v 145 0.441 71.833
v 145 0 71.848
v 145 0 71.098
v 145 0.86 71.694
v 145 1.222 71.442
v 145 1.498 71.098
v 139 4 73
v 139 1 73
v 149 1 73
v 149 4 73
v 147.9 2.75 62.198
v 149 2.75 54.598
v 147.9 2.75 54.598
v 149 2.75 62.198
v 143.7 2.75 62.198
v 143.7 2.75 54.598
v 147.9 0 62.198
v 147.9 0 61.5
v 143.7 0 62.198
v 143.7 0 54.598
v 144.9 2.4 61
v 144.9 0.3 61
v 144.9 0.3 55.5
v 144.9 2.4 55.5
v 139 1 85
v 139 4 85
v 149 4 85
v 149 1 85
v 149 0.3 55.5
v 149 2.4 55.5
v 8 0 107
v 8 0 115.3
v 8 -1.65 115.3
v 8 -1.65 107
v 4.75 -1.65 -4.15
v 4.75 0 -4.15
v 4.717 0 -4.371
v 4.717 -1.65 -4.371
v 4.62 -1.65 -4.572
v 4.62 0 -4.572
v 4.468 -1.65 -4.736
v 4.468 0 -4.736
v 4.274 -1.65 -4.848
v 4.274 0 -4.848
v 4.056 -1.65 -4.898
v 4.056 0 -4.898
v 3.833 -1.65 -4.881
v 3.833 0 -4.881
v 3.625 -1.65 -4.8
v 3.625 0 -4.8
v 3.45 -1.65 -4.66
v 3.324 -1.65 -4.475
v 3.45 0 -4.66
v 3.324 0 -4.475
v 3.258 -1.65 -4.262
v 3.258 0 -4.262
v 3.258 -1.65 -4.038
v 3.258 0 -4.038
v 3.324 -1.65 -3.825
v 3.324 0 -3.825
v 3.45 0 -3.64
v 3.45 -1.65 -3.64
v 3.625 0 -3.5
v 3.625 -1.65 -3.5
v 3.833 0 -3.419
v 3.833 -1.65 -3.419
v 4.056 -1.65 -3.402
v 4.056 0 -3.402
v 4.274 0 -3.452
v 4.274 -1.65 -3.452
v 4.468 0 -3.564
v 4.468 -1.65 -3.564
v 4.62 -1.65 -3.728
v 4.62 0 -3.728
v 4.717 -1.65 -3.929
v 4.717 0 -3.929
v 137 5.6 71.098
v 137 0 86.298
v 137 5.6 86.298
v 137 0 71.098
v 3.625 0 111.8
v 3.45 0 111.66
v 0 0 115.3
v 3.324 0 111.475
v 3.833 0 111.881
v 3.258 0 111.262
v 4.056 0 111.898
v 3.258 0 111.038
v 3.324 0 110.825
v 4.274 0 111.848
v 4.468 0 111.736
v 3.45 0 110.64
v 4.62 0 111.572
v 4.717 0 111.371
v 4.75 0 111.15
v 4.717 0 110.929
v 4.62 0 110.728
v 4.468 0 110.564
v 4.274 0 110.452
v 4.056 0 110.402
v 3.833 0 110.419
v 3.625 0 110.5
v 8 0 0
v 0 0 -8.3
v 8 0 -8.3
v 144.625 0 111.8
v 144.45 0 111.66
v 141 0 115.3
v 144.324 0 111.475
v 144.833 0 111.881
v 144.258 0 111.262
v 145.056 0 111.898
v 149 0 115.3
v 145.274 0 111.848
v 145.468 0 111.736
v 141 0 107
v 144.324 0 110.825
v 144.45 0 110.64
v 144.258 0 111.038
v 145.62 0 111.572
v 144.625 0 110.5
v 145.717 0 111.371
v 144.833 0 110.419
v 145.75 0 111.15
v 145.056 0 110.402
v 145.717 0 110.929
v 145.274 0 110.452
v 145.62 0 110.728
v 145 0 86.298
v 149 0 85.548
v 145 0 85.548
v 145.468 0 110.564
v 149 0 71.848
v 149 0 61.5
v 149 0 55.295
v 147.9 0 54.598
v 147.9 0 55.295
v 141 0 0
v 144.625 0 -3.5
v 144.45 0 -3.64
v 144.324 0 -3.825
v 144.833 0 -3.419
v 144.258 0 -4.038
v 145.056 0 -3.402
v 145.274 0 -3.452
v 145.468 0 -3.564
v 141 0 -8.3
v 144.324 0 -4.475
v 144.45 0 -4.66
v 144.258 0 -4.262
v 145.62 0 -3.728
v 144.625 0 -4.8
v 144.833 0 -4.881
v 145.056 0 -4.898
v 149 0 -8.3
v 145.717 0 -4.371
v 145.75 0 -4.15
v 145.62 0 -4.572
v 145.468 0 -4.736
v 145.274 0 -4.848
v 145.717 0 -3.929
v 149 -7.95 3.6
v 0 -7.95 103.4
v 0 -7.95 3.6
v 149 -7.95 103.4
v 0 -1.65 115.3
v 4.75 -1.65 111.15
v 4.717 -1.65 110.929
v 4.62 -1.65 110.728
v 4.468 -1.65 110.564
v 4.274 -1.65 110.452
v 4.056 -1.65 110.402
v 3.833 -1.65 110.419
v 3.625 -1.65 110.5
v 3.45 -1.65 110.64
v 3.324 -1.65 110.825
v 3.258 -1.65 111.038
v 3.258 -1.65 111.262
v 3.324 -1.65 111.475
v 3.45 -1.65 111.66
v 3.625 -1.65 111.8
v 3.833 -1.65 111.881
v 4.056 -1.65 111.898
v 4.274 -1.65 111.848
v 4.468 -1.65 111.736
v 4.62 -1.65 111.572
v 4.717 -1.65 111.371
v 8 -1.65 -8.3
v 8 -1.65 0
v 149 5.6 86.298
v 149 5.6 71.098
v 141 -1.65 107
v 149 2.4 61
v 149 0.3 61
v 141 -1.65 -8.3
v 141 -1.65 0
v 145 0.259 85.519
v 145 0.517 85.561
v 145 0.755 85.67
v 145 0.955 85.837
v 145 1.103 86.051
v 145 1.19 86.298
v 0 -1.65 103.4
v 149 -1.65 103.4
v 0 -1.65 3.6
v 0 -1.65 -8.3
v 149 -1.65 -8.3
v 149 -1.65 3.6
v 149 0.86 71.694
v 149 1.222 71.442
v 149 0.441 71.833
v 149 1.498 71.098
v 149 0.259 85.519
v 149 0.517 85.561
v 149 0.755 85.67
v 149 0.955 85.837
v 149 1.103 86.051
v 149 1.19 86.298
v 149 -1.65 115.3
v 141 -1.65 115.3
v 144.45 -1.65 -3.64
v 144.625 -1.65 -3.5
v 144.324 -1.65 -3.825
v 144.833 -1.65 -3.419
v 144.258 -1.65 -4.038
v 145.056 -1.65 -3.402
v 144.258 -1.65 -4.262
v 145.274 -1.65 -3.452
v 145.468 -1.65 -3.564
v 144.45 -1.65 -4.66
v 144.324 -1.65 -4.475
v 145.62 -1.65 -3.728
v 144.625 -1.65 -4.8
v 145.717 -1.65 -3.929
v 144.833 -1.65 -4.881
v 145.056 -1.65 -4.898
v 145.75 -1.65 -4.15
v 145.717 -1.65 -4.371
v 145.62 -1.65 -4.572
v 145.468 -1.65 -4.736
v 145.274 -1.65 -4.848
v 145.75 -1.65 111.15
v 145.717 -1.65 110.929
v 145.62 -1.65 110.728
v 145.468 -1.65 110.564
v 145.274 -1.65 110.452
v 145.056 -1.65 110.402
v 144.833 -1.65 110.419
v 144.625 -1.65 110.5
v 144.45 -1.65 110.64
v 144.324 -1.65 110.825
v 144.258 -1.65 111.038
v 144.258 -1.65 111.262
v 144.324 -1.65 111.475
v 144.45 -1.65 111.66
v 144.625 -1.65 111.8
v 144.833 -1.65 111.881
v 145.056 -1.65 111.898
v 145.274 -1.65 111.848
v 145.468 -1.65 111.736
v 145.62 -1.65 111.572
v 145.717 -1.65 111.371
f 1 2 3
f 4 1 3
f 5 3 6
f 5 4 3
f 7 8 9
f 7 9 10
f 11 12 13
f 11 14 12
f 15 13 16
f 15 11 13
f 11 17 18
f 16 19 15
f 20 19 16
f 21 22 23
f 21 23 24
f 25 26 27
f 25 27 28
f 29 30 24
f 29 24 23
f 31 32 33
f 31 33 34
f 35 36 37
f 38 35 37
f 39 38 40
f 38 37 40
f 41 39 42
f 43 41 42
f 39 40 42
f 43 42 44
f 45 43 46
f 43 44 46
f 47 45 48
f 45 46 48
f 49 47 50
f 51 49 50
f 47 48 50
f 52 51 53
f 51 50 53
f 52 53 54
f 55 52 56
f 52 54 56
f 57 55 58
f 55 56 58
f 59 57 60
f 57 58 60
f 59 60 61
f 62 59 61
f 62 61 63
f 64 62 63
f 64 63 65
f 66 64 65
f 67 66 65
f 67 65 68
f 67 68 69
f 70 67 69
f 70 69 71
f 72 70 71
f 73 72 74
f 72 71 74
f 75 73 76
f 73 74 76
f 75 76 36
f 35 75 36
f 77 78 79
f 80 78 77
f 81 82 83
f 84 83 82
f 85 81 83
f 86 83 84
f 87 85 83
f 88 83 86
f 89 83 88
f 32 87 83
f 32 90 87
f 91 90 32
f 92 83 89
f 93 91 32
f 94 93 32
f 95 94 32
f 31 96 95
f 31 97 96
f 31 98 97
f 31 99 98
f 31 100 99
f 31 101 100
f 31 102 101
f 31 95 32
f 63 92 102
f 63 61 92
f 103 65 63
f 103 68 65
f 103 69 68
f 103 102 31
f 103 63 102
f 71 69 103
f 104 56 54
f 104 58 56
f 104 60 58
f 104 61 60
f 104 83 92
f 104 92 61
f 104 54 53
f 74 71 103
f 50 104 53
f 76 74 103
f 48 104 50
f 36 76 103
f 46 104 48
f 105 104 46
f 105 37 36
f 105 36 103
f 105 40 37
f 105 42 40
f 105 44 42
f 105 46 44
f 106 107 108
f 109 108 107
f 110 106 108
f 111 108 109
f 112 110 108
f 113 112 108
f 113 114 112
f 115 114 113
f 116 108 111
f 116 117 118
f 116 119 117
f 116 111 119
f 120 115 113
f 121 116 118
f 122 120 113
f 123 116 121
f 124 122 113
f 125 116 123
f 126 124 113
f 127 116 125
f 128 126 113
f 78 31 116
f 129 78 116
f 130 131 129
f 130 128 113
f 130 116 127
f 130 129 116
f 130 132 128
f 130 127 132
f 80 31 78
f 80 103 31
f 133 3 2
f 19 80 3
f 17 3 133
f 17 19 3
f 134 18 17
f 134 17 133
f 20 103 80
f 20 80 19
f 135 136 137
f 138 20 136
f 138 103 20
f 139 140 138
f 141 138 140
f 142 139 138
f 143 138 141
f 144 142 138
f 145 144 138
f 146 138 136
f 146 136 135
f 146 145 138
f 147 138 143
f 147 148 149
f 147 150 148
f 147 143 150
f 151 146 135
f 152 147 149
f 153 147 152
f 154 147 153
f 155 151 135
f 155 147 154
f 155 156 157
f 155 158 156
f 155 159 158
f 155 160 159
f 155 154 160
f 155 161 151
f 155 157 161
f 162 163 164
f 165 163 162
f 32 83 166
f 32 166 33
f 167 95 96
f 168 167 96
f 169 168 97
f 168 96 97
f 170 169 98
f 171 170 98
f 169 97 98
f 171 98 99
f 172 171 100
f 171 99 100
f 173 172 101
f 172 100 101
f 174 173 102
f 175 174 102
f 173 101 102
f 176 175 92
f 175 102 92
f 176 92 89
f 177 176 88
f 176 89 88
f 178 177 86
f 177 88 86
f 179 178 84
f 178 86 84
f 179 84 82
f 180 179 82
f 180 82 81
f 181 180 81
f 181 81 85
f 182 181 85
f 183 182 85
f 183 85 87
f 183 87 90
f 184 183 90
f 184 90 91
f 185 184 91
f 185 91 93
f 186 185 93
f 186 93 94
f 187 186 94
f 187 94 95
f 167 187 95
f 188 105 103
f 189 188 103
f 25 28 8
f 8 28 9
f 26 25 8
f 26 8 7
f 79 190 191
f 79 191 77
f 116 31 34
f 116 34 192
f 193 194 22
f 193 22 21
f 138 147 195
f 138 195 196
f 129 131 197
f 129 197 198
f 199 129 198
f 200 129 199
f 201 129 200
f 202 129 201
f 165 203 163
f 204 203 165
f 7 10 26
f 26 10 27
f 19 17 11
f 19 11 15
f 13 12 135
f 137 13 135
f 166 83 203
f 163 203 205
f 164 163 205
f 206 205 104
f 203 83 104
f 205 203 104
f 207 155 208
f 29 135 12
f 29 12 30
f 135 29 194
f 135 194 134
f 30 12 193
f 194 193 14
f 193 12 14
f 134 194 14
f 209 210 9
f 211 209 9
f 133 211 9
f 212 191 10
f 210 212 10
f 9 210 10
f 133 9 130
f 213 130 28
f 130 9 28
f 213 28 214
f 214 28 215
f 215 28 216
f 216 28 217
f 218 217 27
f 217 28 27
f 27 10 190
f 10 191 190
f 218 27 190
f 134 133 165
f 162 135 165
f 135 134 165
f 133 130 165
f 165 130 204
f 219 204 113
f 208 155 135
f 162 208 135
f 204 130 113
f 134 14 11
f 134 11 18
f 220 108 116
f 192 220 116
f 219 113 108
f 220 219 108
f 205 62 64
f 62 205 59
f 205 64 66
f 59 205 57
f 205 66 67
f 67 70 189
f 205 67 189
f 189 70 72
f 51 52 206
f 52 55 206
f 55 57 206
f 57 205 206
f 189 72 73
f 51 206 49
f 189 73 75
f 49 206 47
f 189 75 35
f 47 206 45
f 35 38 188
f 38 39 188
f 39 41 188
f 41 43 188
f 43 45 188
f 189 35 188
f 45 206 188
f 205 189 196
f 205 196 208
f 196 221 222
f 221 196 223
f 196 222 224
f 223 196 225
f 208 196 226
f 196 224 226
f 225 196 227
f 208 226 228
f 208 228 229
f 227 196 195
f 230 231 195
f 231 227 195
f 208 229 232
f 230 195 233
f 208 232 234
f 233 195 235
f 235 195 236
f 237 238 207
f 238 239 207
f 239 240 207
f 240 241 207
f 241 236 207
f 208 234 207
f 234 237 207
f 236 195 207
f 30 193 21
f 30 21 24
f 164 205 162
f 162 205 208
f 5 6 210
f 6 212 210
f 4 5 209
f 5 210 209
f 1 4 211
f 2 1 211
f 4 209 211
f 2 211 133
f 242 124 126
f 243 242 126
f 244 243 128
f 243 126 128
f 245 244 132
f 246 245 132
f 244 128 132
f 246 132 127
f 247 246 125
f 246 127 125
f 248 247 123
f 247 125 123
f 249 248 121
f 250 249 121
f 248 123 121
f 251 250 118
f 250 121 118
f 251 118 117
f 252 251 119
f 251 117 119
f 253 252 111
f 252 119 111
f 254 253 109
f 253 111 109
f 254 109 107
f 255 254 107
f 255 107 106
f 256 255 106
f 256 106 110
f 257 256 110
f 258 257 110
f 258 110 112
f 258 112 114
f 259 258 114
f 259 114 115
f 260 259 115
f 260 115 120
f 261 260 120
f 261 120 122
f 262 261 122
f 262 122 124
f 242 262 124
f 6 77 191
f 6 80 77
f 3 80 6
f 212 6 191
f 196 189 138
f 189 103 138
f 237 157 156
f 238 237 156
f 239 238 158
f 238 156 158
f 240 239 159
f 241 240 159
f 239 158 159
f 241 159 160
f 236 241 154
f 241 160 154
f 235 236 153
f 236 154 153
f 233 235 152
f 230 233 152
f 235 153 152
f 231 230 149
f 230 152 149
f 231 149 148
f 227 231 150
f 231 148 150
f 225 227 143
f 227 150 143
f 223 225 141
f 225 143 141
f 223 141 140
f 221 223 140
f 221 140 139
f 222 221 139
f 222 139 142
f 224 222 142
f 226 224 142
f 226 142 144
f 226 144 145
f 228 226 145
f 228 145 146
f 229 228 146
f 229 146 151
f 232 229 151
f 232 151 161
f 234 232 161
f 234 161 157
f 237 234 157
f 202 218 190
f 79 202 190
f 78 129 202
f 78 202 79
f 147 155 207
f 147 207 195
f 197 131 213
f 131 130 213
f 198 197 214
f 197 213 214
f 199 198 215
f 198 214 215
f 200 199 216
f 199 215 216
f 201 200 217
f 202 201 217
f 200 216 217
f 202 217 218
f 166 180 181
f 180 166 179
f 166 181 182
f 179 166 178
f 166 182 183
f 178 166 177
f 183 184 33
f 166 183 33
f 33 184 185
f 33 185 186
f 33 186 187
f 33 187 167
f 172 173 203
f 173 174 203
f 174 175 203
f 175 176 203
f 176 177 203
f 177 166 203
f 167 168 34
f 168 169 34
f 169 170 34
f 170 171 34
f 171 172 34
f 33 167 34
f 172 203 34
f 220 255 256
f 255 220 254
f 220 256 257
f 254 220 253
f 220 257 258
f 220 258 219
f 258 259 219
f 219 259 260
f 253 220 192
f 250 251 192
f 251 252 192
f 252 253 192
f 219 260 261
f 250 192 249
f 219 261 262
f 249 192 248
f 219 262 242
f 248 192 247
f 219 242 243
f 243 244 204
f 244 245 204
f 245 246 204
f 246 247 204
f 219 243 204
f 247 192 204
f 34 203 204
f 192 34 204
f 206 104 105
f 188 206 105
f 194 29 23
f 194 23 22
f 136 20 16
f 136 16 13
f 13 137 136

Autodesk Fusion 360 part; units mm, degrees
sketch "Sketch1" plane through (0, 0, 0) normal (0, 1, 0) x (1, 0, 0)
  line L0 (0, 0) -> (149, 0)
  line L1 (149, 0) -> (149, -107)
  line L2 (0, 0) -> (0, -107)
  line L3 (0, -107) -> (149, -107)
  line L4 (0, -107) -> (0, -115.3)
  line L5 (0, -115.3) -> (8, -115.3)
  line L6 (8, -115.3) -> (8, -107)
  line L7 (149, -107) -> (149, -115.3)
  line L8 (149, -115.3) -> (141, -115.3)
  line L9 (141, -115.3) -> (141, -107)
  line L10 (141, -107) -> (149, -115.3) construction
  line L11 (141, -115.3) -> (149, -107) construction
  circle A0 centre (145, -111.15) radius 0.75
  circle A1 centre (4, -111.15) radius 0.75
  line L12 (0, -115.3) -> (8, -107) construction
  line L13 (8, -115.3) -> (0, -107) construction
  line L14 (0, 0) -> (0, 8.3)
  line L15 (0, 8.3) -> (8, 8.3)
  line L16 (8, 8.3) -> (8, 0)
  line L17 (149, 0) -> (149, 8.3)
  line L18 (149, 8.3) -> (141, 8.3)
  line L19 (141, 8.3) -> (141, 0)
  line L20 (149, 0) -> (141, 8.3) construction
  line L21 (141, 0) -> (149, 8.3) construction
  line L22 (0, 0) -> (8, 8.3) construction
  line L23 (8, 0) -> (0, 8.3) construction
  circle A2 centre (4, 4.15) radius 0.75
  circle A3 centre (145, 4.15) radius 0.75
  dimension "d1" = 149
  dimension "d2" = 107
  dimension "d3" = 107
  dimension "d4" = 149
  dimension "d5" = 8.3
  dimension "d6" = 8
  dimension "d7" = 8.3
  dimension "d8" = 8
  dimension "d9" = 1.5
  dimension "d10" = 1.5
  dimension "d11" = 8.3
  dimension "d12" = 8
  dimension "d13" = 8.3
  dimension "d14" = 8
  dimension "d15" = 1.5
  dimension "d16" = 1.5
extrude "Extrude1" add sketch "Sketch1" against normal blind 1.65
sketch "Sketch2" plane through (0, -1.65, 0) normal (0, -1, 0) x (1, 0, 0)
  circle A0 centre (145, -4.15) radius 0.75
  circle A1 centre (4, 111.15) radius 0.75
  circle A2 centre (145, 111.15) radius 0.75
  circle A3 centre (4, -4.15) radius 0.75
  line L0 (149, -8.3) -> (149, 115.3)
  line L1 (149, 115.3) -> (141, 115.3)
  line L2 (141, 115.3) -> (141, 107)
  line L3 (141, 107) -> (8, 107)
  line L4 (8, 107) -> (8, 115.3)
  line L5 (8, 115.3) -> (0, 115.3)
  line L6 (0, 115.3) -> (0, -8.3)
  line L7 (0, -8.3) -> (8, -8.3)
  line L8 (8, -8.3) -> (8, 0)
  line L9 (8, 0) -> (141, 0)
  line L10 (141, 0) -> (141, -8.3)
  line L11 (141, -8.3) -> (149, -8.3)
  line L12 (0, 107) -> (0, 103.4) construction
  line L13 (0, 103.4) -> (149, 103.4)
  line L14 (0, 0) -> (0, 3.6) construction
  line L15 (8, 107) -> (-0.0006, 107) construction
  line L16 (8, 0) -> (0, 0) construction
  line L17 (0, 3.6) -> (149, 3.6)
  dimension "d19" = 3.6
  dimension "d20" = 3.6
extrude "Extrude2" add sketch "Sketch2" along normal blind 6.3 contours L0 L6 L13 L17
sketch "Sketch3" plane through (149, 0, 0) normal (1, 0, 0) x (0, 1, 0)
  line L0 (0, -8.3) -> (0, 115.3)
  line L1 (0, 115.3) -> (-1.65, 115.3)
  line L2 (-1.65, 115.3) -> (-1.65, 103.4)
  line L3 (-1.65, 103.4) -> (-7.95, 103.4)
  line L4 (-7.95, 103.4) -> (-7.95, 3.6)
  line L5 (-7.95, 3.6) -> (-1.65, 3.6)
  line L6 (-1.65, 3.6) -> (-1.65, -8.3)
  line L7 (-1.65, -8.3) -> (0, -8.3)
sketch "Sketch4" plane through (0, 0, 0) normal (0, 1, 0) x (-1, 0, 0)
  circle A0 centre (-145, -4.15) radius 0.75
  circle A1 centre (-4, 111.15) radius 0.75
  circle A2 centre (-145, 111.15) radius 0.75
  circle A3 centre (-4, -4.15) radius 0.75
  line L0 (-149, 115.3) -> (-149, -8.3)
  line L1 (-149, -8.3) -> (-141, -8.3)
  line L2 (-141, -8.3) -> (-141, 0)
  line L3 (-141, 0) -> (-8, 0)
  line L4 (-8, 0) -> (-8, -8.3)
  line L5 (-8, -8.3) -> (0, -8.3)
  line L6 (0, -8.3) -> (0, 115.3)
  line L7 (0, 115.3) -> (-8, 115.3)
  line L8 (-8, 115.3) -> (-8, 107)
  line L9 (-8, 107) -> (-141, 107)
  line L10 (-141, 107) -> (-141, 115.3)
  line L11 (-141, 115.3) -> (-149, 115.3)
  line L12 (-149, 106.8976) -> (-149, 86.2976) construction
  line L13 (-149, 86.2976) -> (-137, 86.2976)
  line L14 (-137, 86.2976) -> (-137, 71.0976)
  line L15 (-137, 71.0976) -> (-149, 71.0976)
  dimension "d23" = 20.6
  dimension "d24" = 12
  dimension "d25" = 15.2
extrude "Extrude3" add sketch "Sketch4" along normal blind 5.6 contours L0 L13 L14 L15
sketch "Sketch5" plane through (149, 0, 0) normal (1, 0, 0) x (0, 1, 0)
  line L0 (0, -8.3) -> (0, 71.0976)
  line L1 (0, 71.0976) -> (5.6, 71.0976)
  line L2 (5.6, 71.0976) -> (5.6, 86.2976)
  line L3 (5.6, 86.2976) -> (0, 86.2976)
  line L4 (0, 86.2976) -> (0, 115.3)
  line L5 (0, 115.3) -> (-1.65, 115.3)
  line L6 (-1.65, 115.3) -> (-1.65, 103.4)
  line L7 (-1.65, 103.4) -> (-7.95, 103.4)
  line L8 (-7.95, 103.4) -> (-7.95, 3.6)
  line L9 (-7.95, 3.6) -> (-1.65, 3.6)
  line L10 (-1.65, 3.6) -> (-1.65, -8.3)
  line L11 (-1.65, -8.3) -> (0, -8.3)
  line L12 (0, 86.2976) -> (0, 71.0976)
  line L13 (0, 86.2976) -> (0, 85.5476) construction
  arc A0 (0, 85.5476) -> (1.1901, 86.2976) centre (0.2339, 86.4956) ccw
  line L14 (0, 71.0976) -> (0, 71.8476) construction
  arc A1 (1.4983, 71.0976) -> (0, 71.8476) centre (0.1697, 70.3149) ccw
  dimension "d29" = 0.75
  dimension "d30" = 0.75
extrude "Extrude4" cut sketch "Sketch5" against normal blind 4 contours L1 L12 A1 | L3 L12 A0
sketch "Sketch6" plane through (149, 0, 0) normal (1, 0, 0) x (0, 1, 0)
  arc A0 (0, 85.5476) -> (1.1901, 86.2976) centre (0.2339, 86.4956) ccw
  line L0 (0, 85.5476) -> (0, 115.3)
  line L1 (0, 115.3) -> (-1.65, 115.3)
  line L2 (-1.65, 115.3) -> (-1.65, 103.4)
  line L3 (-1.65, 103.4) -> (-7.95, 103.4)
  line L4 (-7.95, 103.4) -> (-7.95, 3.6)
  line L5 (-7.95, 3.6) -> (-1.65, 3.6)
  line L6 (-1.65, 3.6) -> (-1.65, -8.3)
  line L7 (-1.65, -8.3) -> (0, -8.3)
  line L8 (0, -8.3) -> (0, 71.8476)
  arc A1 (1.4983, 71.0976) -> (0, 71.8476) centre (0.1697, 70.3149) ccw
  line L9 (1.4983, 71.0976) -> (5.6, 71.0976)
  line L10 (5.6, 71.0976) -> (5.6, 86.2976)
  line L11 (5.6, 86.2976) -> (1.1901, 86.2976)
  line L12 (1, 85) -> (1, 73)
  line L13 (1, 73) -> (4, 73)
  line L14 (4, 73) -> (4, 85)
  line L15 (4, 85) -> (1, 85)
extrude "Extrude5" cut sketch "Sketch6" against normal blind 10 contours L12 L13 L14 L15
sketch "Sketch7" plane through (0, 0, 86.2976) normal (0, 0, 1) x (-1, 0, 0)
  line L0 (-145, 0) -> (-145, -1.1901)
  line L1 (-145, -1.1901) -> (-149, -1.1901)
  line L2 (-149, -1.1901) -> (-149, -5.6)
  line L3 (-149, -5.6) -> (-137, -5.6)
  line L4 (-137, -5.6) -> (-137, 0)
  line L5 (-137, 0) -> (-145, 0)
sketch "Sketch8" plane through (0, 0, 0) normal (0, 1, 0) x (-1, 0, 0)
  line L0 (-137, 71.0976) -> (-145, 71.0976)
  line L1 (-145, 71.0976) -> (-145, 71.8476)
  line L2 (-145, 71.8476) -> (-149, 71.8476)
  line L3 (-149, 71.8476) -> (-149, -8.3)
  line L4 (-149, -8.3) -> (-141, -8.3)
  line L5 (-141, -8.3) -> (-141, 0)
  line L6 (-141, 0) -> (-8, 0)
  line L7 (-8, 0) -> (-8, -8.3)
  line L8 (-8, -8.3) -> (0, -8.3)
  line L9 (0, -8.3) -> (0, 115.3)
  line L10 (0, 115.3) -> (-8, 115.3)
  line L11 (-8, 115.3) -> (-8, 107)
  line L12 (-8, 107) -> (-141, 107)
  line L13 (-141, 107) -> (-141, 115.3)
  line L14 (-141, 115.3) -> (-149, 115.3)
  line L15 (-149, 115.3) -> (-149, 85.5476)
  line L16 (-149, 85.5476) -> (-145, 85.5476)
  line L17 (-145, 85.5476) -> (-145, 86.2976)
  line L18 (-145, 86.2976) -> (-137, 86.2976)
  line L19 (-137, 86.2976) -> (-137, 71.0976)
  circle A0 centre (-145, -4.15) radius 0.75
  circle A1 centre (-4, 111.15) radius 0.75
  circle A2 centre (-145, 111.15) radius 0.75
  circle A3 centre (-4, -4.15) radius 0.75
  line L20 (-149, 71.0976) -> (-149, 62.1976) construction
  line L21 (-149, 62.1976) -> (-143.7, 62.1976)
  line L22 (-143.7, 62.1976) -> (-143.7, 54.5976)
  line L23 (-143.7, 54.5976) -> (-149, 54.5976)
  dimension "d35" = 8.9
  dimension "d36" = 5.3
  dimension "d37" = 7.6
extrude "Extrude6" add sketch "Sketch8" along normal blind 2.75 contours L3 L21 L22 L23
sketch "Sketch9" plane through (149, 0, 0) normal (1, 0, 0) x (0, 1, 0)
  line L0 (1, 73) -> (1, 85)
  line L1 (1, 85) -> (4, 85)
  line L2 (4, 85) -> (4, 73)
  line L3 (4, 73) -> (1, 73)
  arc A0 (0, 85.5476) -> (1.1901, 86.2976) centre (0.2339, 86.4956) ccw
  line L4 (0, 85.5476) -> (0, 115.3)
  line L5 (0, 115.3) -> (-1.65, 115.3)
  line L6 (-1.65, 115.3) -> (-1.65, 103.4)
  line L7 (-1.65, 103.4) -> (-7.95, 103.4)
  line L8 (-7.95, 103.4) -> (-7.95, 3.6)
  line L9 (-7.95, 3.6) -> (-1.65, 3.6)
  line L10 (-1.65, 3.6) -> (-1.65, -8.3)
  line L11 (-1.65, -8.3) -> (0, -8.3)
  line L12 (0, -8.3) -> (0, 54.5976)
  line L13 (0, 54.5976) -> (2.75, 54.5976)
  line L14 (2.75, 54.5976) -> (2.75, 62.1976)
  line L15 (2.75, 62.1976) -> (0, 62.1976)
  line L16 (0, 62.1976) -> (0, 71.8476)
  arc A1 (1.4983, 71.0976) -> (0, 71.8476) centre (0.1697, 70.3149) ccw
  line L17 (1.4983, 71.0976) -> (5.6, 71.0976)
  line L18 (5.6, 71.0976) -> (5.6, 86.2976)
  line L19 (5.6, 86.2976) -> (1.1901, 86.2976)
  line L20 (2.75, 62.1976) -> (0, 61.5)
  line L21 (2.75, 62.1976) -> (0, 61.5)
  line L22 (2.75, 54.5976) -> (0, 55.2952)
  line L23 (0, 62.1976) -> (0, 61.5)
  line L24 (0, 55.2952) -> (0, 54.5976)
extrude "Extrude7" cut sketch "Sketch9" against normal blind 1.1 contours L15 L20 L21 L23 | L13 L22 L24
sketch "Sketch10" plane through (149, 0, 0) normal (1, 0, 0) x (0, 1, 0)
  line L0 (1, 73) -> (1, 85)
  line L1 (1, 85) -> (4, 85)
  line L2 (4, 85) -> (4, 73)
  line L3 (4, 73) -> (1, 73)
  line L4 (0, -8.3) -> (0, 55.2952)
  line L5 (0, 55.2952) -> (2.75, 54.5976)
  line L6 (2.75, 54.5976) -> (2.75, 62.1976)
  line L7 (2.75, 62.1976) -> (0, 61.5)
  line L8 (0, 61.5) -> (0, 71.8476)
  arc A0 (1.4983, 71.0976) -> (0, 71.8476) centre (0.1697, 70.3149) ccw
  line L9 (1.4983, 71.0976) -> (5.6, 71.0976)
  line L10 (5.6, 71.0976) -> (5.6, 86.2976)
  line L11 (5.6, 86.2976) -> (1.1901, 86.2976)
  arc A1 (0, 85.5476) -> (1.1901, 86.2976) centre (0.2339, 86.4956) ccw
  line L12 (0, 85.5476) -> (0, 115.3)
  line L13 (0, 115.3) -> (-1.65, 115.3)
  line L14 (-1.65, 115.3) -> (-1.65, 103.4)
  line L15 (-1.65, 103.4) -> (-7.95, 103.4)
  line L16 (-7.95, 103.4) -> (-7.95, 3.6)
  line L17 (-7.95, 3.6) -> (-1.65, 3.6)
  line L18 (-1.65, 3.6) -> (-1.65, -8.3)
  line L19 (-1.65, -8.3) -> (0, -8.3)
  line L20 (0.3, 61) -> (2.4, 61)
  line L21 (2.4, 61) -> (2.4, 55.5)
  line L22 (2.4, 55.5) -> (0.5, 55.5)
  line L23 (0.5, 55.5) -> (0.3, 55.5)
  line L24 (0.3, 55.5) -> (0.3, 61)
extrude "Extrude8" cut sketch "Sketch10" against normal blind 4.1 contours L20 L21 L22 L23 L24
